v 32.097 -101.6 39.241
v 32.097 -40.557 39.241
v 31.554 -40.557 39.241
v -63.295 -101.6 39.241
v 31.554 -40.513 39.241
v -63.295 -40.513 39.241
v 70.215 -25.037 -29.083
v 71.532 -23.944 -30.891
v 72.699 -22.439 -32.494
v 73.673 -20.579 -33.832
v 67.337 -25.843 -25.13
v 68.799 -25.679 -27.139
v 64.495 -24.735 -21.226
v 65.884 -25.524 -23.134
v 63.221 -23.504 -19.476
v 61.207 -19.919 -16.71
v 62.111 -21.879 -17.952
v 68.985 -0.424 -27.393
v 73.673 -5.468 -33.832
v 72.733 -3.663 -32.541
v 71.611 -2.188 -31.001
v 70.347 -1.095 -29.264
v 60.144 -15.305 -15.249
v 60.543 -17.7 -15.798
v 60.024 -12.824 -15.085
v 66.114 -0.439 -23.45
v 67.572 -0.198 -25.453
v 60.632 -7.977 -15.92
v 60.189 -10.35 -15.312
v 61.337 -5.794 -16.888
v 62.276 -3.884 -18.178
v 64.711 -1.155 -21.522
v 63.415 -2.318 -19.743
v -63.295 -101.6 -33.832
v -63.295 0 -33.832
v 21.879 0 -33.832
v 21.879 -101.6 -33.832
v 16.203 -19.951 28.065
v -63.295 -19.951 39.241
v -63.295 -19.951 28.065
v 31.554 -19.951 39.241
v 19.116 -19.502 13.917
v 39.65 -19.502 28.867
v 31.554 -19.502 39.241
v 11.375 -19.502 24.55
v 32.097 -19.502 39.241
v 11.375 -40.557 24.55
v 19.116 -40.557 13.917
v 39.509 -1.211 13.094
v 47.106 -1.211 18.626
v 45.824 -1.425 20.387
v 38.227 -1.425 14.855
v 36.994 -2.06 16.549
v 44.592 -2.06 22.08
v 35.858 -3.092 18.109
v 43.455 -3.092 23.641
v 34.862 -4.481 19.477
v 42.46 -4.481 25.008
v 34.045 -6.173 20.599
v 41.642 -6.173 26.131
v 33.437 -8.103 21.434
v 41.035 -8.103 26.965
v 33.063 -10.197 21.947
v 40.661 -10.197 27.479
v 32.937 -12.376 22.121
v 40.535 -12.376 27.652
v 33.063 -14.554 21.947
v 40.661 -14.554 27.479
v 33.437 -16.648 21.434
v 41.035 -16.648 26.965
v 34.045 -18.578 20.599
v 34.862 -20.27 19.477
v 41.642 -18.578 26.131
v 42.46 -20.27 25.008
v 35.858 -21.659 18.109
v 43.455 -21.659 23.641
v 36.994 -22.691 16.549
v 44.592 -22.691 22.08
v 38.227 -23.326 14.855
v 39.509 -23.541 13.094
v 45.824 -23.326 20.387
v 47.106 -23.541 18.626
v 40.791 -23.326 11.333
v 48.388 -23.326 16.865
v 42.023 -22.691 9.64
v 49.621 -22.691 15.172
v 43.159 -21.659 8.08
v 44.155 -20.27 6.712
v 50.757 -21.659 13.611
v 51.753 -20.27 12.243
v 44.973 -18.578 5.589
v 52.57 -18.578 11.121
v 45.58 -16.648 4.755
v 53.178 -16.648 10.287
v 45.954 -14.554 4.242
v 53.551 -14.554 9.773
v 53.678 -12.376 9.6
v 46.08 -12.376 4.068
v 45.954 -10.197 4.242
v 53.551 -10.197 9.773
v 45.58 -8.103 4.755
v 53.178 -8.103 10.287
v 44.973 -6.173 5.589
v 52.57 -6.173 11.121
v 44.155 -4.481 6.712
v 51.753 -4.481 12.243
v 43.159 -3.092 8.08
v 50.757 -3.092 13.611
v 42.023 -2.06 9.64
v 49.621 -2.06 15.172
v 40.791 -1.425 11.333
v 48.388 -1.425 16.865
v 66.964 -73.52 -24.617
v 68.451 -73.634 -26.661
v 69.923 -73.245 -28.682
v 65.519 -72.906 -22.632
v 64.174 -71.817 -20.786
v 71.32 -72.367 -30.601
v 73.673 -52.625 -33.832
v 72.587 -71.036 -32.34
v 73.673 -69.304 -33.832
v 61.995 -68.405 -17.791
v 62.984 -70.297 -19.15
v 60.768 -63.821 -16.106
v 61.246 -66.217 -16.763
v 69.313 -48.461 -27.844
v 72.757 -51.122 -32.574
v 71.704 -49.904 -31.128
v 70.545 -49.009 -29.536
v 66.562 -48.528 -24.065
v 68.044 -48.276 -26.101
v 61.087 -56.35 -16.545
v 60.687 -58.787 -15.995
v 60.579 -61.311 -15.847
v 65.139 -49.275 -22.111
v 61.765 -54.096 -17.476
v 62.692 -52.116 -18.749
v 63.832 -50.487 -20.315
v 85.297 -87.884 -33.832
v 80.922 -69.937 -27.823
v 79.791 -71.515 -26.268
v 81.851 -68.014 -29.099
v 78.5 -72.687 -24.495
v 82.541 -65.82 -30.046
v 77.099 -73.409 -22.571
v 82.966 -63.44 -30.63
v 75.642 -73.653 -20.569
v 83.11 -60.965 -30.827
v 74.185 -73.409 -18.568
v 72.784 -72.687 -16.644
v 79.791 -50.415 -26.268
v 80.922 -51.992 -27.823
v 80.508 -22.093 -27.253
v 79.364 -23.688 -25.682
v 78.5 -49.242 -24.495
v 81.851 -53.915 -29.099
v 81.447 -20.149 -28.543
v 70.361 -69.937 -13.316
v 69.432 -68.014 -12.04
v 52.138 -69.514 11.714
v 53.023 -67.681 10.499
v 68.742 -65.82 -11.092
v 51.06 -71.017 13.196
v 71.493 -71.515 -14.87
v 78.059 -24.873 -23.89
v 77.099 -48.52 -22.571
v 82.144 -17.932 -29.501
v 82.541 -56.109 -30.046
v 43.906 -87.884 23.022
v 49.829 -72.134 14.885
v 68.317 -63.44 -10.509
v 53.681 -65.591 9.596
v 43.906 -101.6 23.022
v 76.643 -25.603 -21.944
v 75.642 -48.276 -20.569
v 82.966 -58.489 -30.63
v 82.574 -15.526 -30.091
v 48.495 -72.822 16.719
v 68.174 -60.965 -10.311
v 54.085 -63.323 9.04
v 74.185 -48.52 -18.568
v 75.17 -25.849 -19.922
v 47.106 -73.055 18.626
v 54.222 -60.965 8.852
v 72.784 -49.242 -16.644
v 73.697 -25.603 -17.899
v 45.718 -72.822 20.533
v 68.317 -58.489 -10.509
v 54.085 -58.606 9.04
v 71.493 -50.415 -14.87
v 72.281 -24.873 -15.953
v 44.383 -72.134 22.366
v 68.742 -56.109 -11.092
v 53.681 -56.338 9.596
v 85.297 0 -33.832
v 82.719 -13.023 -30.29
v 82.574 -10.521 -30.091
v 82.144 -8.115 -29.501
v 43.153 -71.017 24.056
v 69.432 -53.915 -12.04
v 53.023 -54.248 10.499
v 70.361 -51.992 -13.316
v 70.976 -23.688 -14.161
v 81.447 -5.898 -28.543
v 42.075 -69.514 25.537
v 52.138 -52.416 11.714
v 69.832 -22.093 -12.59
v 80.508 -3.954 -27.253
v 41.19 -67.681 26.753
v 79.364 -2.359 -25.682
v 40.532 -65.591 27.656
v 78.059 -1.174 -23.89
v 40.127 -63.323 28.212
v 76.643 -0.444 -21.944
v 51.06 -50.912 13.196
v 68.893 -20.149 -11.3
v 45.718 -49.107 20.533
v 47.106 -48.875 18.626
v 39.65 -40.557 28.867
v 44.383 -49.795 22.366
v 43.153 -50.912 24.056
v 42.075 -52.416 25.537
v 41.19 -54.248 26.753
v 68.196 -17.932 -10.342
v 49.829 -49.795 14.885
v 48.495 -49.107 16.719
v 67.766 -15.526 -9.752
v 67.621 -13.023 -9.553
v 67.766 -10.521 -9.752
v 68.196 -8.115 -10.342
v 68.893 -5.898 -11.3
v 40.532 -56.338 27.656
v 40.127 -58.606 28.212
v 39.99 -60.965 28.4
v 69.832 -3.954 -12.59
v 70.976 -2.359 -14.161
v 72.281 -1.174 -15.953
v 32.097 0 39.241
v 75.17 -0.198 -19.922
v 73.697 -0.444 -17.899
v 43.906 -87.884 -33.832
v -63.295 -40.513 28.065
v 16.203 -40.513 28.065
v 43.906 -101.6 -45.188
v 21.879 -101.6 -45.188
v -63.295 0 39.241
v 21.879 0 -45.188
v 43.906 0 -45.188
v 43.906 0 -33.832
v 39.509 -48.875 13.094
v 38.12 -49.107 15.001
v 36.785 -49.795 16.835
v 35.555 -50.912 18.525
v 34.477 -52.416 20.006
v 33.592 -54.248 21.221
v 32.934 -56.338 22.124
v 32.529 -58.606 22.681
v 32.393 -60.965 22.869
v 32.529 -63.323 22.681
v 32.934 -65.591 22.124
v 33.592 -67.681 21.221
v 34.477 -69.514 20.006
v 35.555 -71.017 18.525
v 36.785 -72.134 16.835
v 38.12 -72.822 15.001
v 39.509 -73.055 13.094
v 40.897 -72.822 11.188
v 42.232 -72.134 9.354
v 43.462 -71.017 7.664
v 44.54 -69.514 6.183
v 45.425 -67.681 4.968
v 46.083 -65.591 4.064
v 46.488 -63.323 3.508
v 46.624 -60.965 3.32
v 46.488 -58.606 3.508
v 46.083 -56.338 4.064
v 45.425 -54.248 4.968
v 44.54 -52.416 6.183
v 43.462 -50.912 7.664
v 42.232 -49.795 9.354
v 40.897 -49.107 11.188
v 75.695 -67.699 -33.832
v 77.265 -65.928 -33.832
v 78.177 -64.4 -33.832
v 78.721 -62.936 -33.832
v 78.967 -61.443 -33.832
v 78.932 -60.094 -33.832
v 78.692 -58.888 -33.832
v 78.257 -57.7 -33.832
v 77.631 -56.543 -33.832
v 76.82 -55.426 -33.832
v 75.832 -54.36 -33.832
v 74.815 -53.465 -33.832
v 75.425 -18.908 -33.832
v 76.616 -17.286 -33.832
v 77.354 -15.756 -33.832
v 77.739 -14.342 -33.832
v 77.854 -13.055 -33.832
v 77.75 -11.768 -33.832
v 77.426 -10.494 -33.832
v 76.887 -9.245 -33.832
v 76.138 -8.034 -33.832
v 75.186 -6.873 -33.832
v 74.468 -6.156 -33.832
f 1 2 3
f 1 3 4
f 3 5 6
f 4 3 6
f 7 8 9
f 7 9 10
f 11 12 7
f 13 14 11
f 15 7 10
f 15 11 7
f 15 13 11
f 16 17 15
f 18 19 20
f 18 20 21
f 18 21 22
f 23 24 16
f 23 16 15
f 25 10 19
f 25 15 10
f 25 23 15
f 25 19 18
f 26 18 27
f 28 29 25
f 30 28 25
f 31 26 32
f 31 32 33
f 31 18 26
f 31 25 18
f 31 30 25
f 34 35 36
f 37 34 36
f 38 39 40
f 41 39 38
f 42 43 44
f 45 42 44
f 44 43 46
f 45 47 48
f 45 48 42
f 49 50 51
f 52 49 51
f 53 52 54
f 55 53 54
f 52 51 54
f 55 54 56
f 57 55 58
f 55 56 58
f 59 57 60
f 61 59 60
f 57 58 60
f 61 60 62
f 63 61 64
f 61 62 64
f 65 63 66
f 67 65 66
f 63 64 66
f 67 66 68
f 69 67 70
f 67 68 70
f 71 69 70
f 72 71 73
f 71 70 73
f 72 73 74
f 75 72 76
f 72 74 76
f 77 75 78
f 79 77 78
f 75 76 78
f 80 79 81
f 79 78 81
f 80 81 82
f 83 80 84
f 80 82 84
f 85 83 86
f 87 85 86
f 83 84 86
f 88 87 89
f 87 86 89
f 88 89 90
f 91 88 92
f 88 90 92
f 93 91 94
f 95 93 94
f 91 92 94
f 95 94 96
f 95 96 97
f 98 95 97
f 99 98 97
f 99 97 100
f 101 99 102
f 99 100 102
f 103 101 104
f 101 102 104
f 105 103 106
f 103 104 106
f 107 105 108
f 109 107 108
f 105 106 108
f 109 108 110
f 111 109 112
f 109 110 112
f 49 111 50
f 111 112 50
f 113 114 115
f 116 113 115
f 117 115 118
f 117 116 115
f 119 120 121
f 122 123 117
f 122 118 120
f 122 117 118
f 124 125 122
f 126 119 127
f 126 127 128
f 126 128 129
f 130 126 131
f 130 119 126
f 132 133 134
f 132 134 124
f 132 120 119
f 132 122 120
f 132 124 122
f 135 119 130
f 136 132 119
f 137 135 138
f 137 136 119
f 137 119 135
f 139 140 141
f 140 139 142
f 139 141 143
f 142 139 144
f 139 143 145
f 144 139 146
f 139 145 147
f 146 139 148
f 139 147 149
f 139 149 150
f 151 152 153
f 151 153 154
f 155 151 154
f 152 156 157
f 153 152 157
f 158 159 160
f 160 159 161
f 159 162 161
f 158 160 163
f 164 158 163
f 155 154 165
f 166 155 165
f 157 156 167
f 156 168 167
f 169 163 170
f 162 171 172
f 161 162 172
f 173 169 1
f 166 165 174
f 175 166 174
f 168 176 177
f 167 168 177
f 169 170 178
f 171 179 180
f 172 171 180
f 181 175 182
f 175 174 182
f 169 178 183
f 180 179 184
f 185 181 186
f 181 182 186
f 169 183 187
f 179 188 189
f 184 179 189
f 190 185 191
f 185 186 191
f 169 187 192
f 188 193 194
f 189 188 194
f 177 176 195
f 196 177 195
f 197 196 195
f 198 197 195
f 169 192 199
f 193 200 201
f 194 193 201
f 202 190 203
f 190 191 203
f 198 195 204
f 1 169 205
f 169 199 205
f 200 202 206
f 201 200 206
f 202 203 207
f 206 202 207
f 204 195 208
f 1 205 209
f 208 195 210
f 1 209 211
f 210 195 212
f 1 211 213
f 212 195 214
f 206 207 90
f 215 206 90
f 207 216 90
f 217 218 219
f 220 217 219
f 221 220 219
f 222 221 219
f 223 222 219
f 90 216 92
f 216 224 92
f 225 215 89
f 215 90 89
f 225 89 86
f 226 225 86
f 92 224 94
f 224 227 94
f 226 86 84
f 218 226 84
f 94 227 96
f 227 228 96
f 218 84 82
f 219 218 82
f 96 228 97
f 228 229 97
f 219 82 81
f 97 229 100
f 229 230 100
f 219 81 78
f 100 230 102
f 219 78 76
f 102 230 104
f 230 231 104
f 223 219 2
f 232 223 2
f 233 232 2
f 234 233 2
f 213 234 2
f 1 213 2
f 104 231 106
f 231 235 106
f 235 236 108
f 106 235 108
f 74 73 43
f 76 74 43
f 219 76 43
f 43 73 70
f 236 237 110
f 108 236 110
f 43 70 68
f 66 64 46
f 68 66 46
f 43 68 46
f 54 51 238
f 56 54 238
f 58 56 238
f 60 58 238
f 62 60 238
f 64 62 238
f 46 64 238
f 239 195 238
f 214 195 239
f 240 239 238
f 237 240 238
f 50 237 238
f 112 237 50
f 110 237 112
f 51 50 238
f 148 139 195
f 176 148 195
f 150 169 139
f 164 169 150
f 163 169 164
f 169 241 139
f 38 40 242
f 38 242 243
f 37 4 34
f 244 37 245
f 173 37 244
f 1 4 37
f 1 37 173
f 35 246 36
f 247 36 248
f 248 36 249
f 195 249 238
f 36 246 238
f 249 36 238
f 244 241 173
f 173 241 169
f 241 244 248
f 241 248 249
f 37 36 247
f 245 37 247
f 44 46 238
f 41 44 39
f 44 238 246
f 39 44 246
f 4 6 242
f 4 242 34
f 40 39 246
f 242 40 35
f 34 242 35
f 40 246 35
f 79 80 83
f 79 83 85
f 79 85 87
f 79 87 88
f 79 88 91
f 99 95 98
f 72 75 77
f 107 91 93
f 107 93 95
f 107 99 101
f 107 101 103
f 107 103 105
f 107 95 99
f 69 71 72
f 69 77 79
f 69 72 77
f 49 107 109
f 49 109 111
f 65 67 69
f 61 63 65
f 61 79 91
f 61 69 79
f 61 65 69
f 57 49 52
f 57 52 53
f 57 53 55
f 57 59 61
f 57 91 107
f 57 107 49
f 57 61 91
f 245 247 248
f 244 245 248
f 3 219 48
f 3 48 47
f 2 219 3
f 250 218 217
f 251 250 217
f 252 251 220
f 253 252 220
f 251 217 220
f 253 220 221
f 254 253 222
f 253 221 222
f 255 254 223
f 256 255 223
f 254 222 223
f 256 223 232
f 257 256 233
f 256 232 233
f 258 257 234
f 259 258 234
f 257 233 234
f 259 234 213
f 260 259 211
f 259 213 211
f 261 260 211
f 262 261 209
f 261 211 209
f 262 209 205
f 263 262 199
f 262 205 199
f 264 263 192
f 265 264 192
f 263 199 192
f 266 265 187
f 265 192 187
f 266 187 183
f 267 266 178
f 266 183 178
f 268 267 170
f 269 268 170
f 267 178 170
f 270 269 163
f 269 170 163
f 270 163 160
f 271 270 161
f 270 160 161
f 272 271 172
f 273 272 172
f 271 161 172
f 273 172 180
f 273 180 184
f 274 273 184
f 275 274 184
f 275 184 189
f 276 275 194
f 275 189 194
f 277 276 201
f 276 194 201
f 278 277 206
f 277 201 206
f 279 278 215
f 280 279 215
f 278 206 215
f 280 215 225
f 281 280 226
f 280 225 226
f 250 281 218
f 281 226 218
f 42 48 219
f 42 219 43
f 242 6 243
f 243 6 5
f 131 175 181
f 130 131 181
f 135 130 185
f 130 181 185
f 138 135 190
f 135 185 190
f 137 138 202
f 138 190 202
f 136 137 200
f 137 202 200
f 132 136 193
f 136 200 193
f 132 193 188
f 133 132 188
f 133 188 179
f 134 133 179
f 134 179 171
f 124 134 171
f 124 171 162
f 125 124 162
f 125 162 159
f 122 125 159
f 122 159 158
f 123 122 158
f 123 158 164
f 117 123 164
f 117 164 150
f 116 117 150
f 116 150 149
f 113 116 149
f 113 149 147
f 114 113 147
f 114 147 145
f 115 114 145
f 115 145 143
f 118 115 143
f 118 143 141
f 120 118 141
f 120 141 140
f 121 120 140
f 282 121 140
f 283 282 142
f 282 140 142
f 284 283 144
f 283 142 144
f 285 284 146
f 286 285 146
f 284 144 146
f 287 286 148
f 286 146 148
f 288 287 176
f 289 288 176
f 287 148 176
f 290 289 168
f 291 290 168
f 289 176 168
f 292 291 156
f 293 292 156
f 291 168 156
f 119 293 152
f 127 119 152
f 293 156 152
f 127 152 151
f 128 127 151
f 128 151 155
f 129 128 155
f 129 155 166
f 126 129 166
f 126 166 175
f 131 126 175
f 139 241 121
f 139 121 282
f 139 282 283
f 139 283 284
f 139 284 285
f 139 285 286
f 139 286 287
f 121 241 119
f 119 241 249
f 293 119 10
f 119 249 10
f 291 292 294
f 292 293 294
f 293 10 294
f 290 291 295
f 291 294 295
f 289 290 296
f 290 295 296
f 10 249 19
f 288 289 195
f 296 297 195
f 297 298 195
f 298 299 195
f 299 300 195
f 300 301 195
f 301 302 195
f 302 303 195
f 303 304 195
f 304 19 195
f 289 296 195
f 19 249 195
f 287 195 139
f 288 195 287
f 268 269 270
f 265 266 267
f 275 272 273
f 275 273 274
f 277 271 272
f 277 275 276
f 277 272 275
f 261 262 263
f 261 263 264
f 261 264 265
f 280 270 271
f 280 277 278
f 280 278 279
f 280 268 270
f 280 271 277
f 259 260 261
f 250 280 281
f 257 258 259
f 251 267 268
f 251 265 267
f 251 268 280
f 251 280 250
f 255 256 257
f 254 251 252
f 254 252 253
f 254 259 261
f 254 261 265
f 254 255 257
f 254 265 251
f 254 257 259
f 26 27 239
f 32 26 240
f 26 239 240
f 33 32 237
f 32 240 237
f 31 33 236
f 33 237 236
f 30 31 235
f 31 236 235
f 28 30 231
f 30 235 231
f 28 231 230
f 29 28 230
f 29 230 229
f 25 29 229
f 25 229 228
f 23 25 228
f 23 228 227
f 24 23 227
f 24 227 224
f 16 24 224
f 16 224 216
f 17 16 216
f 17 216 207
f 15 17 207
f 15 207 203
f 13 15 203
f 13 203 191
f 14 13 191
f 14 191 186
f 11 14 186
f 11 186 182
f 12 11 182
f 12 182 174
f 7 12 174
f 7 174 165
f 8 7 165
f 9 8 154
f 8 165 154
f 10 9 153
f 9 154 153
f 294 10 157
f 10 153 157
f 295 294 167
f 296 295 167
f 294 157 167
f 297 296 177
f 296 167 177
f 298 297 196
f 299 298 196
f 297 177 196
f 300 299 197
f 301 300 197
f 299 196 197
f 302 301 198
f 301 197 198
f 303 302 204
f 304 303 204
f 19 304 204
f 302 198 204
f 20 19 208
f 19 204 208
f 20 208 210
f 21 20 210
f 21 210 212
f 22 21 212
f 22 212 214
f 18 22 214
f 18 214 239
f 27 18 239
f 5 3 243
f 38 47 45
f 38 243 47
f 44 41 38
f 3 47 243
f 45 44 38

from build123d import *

# Parameters (mm, degrees)
F1_DEPTH  = 101.6
F2_W      = 95.392908901
F2_H      = 20.5622557551
F3_DEPTH  = 11.176
F5_W      = 21.0552625358
F5_H      = 13.1527595222
F6_DEPTH  = 25.4
F7_R      = 12.0900311227
F7_R_2    = 11.1649780349
F7_R_3    = 12.6885276411
F7_R_4    = 12.8258511979
F8_DEPTH  = 9.398
F10_DEPTH = 13.716


with BuildPart() as f1:
    # F0 (on Front) → F1 (new body)
    with BuildSketch(Plane.XZ):
        Polygon((32.0974774659, 39.2414145172), (-63.2954314351, 39.2414145172), (-63.2954314351, -33.8319987059), (21.8787807971, -33.8319987059), (21.8787807971, -45.1878346503), (43.9058281481, -45.1878346503), (43.9058281481, -33.8319987059), (85.2973610163, -33.8319987059), align=None)
    extrude(amount=F1_DEPTH)

    # F2 (on face) → F3 (cut)
    with BuildSketch(Plane.XY.offset(39.2414145172)):
        with Locations((-15.5989769846, -30.2323354408)):
            Rectangle(F2_W, F2_H)
    extrude(amount=-F3_DEPTH, mode=Mode.SUBTRACT)

    # F5 (on face) → F6 (cut)
    with BuildSketch(Plane(origin=(39.6504866209, 0, 28.8668775402), x_dir=(0, 1, 0), z_dir=(0.8084434725, 0, 0.5885738287))):
        with Locations((-30.0295893103, 6.5763797611)):
            Rectangle(F5_W, F5_H)
    extrude(amount=-F6_DEPTH, mode=Mode.SUBTRACT)

    # F7 (on face) → F8 (cut)
    with BuildSketch(Plane(origin=(39.6504866209, 0, 28.8668775402), x_dir=(0, 1, 0), z_dir=(0.8084434725, 0, 0.5885738287))):
        with Locations((-60.9646290541, -12.6676354557)):
            Circle(F7_R)
        with Locations((-12.3755605891, -12.6676354557)):
            Circle(F7_R_2)
        with Locations((-60.9646290541, -61.1499175429)):
            Circle(F7_R_3)
        with Locations((-13.0234146491, -60.3485517204)):
            Circle(F7_R_4)
    extrude(amount=-F8_DEPTH, mode=Mode.SUBTRACT)

    # F9 (on face) → F10 (cut)
    with BuildSketch(Plane.XZ.offset(101.6)):
        Polygon((43.9058281481, 31.8253524601), (43.9058281481, -33.8319987059), (85.2973610163, -33.8319987059), align=None)
    extrude(amount=-F10_DEPTH, mode=Mode.SUBTRACT)


solid = f1.part
